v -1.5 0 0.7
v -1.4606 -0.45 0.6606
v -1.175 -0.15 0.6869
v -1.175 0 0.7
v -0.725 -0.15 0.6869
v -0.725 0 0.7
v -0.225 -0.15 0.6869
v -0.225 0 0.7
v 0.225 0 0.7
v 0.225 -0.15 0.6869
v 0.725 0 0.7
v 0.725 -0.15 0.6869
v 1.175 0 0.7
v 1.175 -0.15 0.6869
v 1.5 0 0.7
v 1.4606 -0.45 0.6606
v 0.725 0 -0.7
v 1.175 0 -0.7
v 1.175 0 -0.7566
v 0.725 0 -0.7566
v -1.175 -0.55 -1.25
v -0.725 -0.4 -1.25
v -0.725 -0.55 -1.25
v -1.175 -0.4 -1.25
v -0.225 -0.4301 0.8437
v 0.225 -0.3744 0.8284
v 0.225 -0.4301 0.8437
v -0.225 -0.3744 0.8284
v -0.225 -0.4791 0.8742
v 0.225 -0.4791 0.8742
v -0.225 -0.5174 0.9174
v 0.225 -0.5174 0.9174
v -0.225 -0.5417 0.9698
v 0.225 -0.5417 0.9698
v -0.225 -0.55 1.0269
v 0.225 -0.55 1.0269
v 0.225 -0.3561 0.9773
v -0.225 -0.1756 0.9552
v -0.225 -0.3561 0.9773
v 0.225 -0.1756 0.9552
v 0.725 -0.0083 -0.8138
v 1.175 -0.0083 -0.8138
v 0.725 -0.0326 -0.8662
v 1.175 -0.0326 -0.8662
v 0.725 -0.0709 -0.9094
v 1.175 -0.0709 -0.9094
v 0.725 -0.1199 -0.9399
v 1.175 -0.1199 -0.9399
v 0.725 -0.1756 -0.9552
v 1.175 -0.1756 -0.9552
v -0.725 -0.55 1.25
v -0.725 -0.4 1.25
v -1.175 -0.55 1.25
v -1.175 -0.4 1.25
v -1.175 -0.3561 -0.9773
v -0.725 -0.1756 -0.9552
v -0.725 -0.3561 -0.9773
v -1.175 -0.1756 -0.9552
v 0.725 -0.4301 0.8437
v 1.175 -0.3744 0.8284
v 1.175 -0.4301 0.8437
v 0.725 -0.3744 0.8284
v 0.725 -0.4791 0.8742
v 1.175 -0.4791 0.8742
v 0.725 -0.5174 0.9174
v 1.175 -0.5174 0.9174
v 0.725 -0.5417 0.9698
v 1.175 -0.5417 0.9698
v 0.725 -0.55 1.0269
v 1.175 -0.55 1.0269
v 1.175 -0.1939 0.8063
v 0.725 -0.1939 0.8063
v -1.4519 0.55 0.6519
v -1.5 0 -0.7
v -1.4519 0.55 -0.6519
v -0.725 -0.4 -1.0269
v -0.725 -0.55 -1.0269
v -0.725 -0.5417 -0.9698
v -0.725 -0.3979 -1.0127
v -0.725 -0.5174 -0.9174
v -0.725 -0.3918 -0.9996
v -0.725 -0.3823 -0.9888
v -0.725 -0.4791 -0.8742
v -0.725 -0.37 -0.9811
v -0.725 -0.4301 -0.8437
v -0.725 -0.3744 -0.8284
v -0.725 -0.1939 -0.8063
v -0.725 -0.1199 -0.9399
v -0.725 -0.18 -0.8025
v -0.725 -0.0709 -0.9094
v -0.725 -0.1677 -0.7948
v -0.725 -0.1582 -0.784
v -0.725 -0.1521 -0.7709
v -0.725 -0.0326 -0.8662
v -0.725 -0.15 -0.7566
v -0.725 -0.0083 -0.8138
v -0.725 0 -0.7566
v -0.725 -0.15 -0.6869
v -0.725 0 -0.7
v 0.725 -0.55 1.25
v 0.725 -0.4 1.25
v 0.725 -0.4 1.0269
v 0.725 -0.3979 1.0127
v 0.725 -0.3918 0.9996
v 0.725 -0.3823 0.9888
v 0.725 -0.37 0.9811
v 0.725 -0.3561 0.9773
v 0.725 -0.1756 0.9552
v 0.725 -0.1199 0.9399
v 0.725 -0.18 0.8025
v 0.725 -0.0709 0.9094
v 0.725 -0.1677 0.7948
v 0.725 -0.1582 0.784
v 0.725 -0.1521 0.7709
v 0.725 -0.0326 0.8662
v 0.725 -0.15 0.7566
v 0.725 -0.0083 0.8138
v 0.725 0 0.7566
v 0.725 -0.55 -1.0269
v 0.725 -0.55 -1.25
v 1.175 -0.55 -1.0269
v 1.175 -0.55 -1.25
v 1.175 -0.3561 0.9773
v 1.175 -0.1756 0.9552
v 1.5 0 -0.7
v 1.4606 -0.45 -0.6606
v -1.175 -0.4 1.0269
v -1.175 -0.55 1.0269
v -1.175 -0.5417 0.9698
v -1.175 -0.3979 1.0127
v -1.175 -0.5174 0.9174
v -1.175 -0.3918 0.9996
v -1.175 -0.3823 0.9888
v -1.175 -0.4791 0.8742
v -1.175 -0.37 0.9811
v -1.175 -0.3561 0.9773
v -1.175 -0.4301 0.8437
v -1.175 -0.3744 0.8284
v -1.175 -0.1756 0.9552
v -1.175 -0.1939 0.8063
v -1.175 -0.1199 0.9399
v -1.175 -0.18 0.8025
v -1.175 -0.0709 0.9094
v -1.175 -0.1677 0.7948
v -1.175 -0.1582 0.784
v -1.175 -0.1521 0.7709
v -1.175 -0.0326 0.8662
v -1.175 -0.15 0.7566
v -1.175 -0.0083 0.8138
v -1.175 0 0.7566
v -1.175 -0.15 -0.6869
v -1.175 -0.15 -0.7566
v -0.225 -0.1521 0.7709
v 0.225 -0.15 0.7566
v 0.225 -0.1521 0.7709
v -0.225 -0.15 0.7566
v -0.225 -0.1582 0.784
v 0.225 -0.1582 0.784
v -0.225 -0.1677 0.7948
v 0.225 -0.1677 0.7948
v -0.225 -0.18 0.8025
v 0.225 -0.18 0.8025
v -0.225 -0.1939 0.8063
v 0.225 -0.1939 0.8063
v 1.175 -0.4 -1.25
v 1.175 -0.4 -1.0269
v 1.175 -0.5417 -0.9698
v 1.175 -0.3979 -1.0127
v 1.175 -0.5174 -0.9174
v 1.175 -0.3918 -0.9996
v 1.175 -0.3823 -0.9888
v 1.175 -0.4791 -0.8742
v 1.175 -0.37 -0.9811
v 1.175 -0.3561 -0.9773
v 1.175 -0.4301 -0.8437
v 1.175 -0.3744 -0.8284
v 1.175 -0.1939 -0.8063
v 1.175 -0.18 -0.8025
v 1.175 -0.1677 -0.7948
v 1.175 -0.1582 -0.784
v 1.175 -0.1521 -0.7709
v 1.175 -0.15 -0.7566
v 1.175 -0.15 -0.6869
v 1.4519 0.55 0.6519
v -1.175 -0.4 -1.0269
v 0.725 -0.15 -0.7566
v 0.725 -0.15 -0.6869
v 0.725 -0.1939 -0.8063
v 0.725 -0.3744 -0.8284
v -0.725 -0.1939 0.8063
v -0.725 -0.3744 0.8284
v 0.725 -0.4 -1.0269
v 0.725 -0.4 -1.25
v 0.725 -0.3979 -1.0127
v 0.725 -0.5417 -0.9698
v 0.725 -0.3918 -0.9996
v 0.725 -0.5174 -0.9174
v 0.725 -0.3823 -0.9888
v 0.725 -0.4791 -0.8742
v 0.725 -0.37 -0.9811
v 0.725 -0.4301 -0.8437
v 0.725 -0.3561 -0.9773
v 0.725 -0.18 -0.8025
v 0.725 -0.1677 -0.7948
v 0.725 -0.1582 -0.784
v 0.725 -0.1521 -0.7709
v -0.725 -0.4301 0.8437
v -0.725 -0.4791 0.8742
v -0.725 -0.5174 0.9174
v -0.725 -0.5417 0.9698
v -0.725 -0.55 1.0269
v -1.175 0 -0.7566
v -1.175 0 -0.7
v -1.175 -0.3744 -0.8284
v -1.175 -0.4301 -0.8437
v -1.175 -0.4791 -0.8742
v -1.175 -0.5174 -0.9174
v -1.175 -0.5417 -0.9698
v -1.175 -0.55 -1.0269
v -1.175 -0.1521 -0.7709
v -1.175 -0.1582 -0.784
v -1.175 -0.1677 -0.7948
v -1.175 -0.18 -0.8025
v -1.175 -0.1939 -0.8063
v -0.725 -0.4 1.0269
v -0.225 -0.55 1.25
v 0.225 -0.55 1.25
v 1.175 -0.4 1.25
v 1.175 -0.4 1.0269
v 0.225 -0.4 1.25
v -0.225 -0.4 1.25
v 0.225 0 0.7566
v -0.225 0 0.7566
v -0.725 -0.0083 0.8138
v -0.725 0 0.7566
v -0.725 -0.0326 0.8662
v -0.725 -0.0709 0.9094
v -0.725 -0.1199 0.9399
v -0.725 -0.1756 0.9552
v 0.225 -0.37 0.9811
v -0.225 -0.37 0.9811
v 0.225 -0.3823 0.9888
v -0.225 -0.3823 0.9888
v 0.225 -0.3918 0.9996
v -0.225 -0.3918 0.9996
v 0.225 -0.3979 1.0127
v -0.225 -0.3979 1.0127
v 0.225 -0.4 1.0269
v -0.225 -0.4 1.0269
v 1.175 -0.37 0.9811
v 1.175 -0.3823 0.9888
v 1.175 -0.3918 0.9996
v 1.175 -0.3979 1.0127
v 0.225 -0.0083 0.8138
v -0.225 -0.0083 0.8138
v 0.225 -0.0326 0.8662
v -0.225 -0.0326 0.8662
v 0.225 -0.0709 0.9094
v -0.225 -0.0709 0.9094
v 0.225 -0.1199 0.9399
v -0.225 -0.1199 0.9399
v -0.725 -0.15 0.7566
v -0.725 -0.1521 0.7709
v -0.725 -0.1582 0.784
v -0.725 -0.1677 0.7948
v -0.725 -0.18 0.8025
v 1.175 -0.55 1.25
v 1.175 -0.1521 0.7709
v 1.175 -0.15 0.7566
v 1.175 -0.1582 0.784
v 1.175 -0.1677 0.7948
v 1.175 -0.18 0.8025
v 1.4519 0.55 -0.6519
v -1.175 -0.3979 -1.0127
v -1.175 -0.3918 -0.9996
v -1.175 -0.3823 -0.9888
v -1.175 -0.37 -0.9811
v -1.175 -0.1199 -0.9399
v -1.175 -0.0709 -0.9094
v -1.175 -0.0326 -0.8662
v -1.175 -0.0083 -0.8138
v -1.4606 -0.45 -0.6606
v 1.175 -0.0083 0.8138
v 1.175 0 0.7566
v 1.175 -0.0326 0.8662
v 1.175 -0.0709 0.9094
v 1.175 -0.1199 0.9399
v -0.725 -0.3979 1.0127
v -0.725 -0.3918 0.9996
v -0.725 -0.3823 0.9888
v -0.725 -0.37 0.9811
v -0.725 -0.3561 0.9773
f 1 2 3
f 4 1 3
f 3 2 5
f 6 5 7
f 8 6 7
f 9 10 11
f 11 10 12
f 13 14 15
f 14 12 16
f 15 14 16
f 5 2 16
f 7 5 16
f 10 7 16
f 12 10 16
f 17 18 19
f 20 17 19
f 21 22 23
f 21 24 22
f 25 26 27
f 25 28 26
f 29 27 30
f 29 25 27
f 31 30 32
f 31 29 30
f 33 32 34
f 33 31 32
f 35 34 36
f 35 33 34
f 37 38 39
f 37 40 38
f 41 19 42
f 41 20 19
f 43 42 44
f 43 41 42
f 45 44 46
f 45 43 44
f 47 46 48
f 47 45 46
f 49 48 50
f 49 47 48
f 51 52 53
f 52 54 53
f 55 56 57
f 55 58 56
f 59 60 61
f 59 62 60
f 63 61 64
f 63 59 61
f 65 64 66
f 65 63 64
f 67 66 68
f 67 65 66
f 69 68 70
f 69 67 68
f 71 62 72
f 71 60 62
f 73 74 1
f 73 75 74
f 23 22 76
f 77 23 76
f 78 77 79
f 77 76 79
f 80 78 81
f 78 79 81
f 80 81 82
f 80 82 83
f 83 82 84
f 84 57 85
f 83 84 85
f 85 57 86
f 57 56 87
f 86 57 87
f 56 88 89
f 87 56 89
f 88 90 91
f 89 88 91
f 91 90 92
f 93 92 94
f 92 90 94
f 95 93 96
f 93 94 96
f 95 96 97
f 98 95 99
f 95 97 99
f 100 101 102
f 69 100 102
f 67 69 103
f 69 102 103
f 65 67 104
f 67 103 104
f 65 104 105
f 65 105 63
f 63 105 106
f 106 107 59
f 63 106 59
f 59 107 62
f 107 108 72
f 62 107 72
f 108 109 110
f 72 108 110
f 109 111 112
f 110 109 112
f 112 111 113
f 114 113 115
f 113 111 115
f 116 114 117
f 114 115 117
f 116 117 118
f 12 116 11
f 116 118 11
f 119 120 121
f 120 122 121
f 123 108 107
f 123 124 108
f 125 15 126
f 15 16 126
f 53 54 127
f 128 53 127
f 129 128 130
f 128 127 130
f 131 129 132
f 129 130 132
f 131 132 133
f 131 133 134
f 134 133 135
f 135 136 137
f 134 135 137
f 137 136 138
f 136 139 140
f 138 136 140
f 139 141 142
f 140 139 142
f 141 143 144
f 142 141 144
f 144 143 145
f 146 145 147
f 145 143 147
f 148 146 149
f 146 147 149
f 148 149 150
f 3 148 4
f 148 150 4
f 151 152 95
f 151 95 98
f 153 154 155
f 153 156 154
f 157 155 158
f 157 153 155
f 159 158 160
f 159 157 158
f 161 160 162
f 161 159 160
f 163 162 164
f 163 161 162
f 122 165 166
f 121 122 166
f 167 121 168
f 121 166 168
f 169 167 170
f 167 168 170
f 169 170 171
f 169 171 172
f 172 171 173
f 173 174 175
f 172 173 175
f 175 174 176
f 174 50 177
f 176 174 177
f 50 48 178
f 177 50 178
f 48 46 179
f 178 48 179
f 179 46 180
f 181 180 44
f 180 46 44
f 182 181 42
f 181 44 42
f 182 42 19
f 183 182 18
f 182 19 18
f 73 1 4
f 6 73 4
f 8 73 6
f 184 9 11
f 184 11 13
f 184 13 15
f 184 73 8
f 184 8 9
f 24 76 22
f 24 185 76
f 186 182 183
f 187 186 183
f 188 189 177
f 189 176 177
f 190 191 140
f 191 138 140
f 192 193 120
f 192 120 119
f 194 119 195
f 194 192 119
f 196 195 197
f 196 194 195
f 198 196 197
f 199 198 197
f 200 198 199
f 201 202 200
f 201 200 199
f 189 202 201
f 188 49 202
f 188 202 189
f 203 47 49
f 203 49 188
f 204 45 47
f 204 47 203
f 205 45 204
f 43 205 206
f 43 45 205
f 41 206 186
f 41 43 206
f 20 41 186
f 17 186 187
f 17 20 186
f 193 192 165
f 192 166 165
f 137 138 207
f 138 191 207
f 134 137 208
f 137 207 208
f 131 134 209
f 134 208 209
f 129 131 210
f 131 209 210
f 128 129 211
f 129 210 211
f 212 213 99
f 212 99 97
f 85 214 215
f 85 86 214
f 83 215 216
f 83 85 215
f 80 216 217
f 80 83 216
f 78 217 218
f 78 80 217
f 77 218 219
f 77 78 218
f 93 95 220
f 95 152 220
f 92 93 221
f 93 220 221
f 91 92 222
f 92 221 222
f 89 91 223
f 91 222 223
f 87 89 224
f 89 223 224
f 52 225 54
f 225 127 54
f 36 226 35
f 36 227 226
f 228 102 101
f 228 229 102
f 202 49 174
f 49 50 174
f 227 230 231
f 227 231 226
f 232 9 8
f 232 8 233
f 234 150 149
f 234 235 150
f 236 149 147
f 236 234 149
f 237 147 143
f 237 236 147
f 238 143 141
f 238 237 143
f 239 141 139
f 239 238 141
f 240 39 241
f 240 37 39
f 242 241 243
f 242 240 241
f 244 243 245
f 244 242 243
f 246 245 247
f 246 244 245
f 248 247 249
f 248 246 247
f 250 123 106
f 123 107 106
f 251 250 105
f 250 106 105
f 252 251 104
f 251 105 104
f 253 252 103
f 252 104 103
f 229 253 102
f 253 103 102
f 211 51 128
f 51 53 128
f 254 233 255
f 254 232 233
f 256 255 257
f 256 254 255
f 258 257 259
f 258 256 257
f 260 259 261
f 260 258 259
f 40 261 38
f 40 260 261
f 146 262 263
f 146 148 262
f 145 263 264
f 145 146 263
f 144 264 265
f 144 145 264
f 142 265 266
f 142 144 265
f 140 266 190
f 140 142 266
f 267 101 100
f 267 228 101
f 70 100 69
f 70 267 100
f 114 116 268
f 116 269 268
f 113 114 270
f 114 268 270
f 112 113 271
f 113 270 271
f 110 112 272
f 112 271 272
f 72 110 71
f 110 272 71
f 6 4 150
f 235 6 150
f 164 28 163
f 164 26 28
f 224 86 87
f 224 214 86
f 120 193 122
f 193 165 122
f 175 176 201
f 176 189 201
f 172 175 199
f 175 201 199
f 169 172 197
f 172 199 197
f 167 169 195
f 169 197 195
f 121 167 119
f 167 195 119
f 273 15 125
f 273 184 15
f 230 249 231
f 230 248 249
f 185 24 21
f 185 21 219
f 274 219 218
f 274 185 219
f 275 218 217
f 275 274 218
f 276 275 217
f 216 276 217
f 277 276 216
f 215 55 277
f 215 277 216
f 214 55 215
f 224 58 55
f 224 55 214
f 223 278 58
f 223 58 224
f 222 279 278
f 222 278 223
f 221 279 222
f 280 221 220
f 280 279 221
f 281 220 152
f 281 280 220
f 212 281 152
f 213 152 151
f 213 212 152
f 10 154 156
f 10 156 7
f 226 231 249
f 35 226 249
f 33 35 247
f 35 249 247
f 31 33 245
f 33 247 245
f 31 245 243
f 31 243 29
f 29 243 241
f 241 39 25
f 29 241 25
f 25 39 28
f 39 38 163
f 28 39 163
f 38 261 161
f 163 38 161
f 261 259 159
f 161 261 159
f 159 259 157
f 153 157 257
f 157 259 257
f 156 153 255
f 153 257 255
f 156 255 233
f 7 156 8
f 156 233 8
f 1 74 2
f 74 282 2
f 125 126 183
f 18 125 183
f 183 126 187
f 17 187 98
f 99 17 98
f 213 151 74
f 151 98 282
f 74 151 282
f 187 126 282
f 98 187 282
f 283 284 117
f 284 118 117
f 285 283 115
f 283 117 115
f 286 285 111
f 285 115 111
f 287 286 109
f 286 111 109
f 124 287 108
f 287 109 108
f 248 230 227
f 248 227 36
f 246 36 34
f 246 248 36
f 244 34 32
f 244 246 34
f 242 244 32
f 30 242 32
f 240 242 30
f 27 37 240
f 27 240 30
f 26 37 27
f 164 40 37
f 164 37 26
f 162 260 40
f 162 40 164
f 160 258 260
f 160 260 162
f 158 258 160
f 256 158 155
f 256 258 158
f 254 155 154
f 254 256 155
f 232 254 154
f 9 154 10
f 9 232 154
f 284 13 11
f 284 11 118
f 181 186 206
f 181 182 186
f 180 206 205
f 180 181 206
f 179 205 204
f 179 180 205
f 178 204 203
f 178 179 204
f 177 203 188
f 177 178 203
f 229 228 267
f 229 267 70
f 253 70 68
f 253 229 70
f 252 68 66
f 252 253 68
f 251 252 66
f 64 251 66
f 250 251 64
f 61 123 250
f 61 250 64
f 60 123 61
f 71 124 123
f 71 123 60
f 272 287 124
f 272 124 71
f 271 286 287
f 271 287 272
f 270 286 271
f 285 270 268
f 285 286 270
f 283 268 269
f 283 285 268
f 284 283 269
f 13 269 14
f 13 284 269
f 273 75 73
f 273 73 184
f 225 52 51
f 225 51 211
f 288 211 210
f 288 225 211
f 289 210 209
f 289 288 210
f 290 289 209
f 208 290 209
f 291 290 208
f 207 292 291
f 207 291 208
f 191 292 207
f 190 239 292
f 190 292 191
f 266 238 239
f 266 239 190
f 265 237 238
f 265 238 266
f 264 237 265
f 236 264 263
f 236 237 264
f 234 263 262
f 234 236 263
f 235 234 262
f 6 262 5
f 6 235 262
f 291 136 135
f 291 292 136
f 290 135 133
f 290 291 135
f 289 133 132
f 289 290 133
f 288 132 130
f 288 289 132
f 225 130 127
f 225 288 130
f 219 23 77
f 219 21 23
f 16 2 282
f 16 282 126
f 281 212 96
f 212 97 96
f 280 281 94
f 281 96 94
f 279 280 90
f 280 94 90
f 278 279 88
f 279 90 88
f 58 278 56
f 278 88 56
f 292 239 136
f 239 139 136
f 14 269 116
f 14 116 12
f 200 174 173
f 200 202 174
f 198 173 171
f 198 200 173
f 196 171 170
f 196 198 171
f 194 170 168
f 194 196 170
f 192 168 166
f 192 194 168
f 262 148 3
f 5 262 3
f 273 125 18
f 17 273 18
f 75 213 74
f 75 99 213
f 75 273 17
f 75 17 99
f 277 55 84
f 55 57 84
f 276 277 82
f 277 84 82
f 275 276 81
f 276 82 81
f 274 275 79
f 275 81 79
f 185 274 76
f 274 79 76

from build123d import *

# Parameters (mm, degrees)
SKETCH1_W                = 3
SKETCH1_H                = 1.4
EXTRUDE1_DEPTH           = 0.55
EXTRUDE1_TAPER           = 5
EXTRUDE1_OTHER_WAY_DEPTH = 0.45
EXTRUDE1_OTHER_WAY_TAPER = 5
EXTRUDE2_DEPTH           = 0.225
EXTRUDE2_DEPTH_BACK      = 0.225
EXTRUDE3_START           = 0.95
EXTRUDE3_DEPTH           = 0.225
MIRROR_START             = 0.95
MIRROR_1_COPY_1_DEPTH    = 0.225
FILLET1_R                = 0.05
FILLET2_R                = 0.2


with BuildPart() as part:
    # Sketch1 → Extrude1 (new body)
    with BuildSketch(Plane(origin=(0, 0, 0), x_dir=(1, 0, 0), z_dir=(0, 1, 0))):
        Rectangle(SKETCH1_W, SKETCH1_H)
    extrude(amount=EXTRUDE1_DEPTH, taper=EXTRUDE1_TAPER)

    # Sketch1 → Extrude1 other way (add)
    with BuildSketch(Plane(origin=(0, 0, 0), x_dir=(1, 0, 0), z_dir=(0, 1, 0))):
        Rectangle(SKETCH1_W, SKETCH1_H)
    extrude(amount=-EXTRUDE1_OTHER_WAY_DEPTH, taper=EXTRUDE1_OTHER_WAY_TAPER)

    # Sketch2 → Extrude2 (add, two sides)
    with BuildSketch(Plane(origin=(0, 0, 0), x_dir=(0, 0, -1), z_dir=(1, 0, 0))) as extrude2_sk:
        Polygon((-0.585273808, 0), (-0.933594965, 0), (-0.98270879, -0.4), (-1.25, -0.4), (-1.25, -0.55), (-0.85, -0.55), (-0.800886176, -0.15), (-0.585273808, -0.15), align=None)
    extrude(amount=EXTRUDE2_DEPTH)
    extrude(extrude2_sk.sketch, amount=-EXTRUDE2_DEPTH_BACK)

    # Sketch2_3 → Extrude3 (add, symmetric)
    with BuildSketch(Plane(origin=(0, 0, 0), x_dir=(0, 0, -1), z_dir=(1, 0, 0)).offset(EXTRUDE3_START)):
        Polygon((0.585273808, 0), (0.933594965, 0), (0.98270879, -0.4), (1.25, -0.4), (1.25, -0.55), (0.85, -0.55), (0.800886176, -0.15), (0.585273808, -0.15), align=None)
    extrude3 = extrude(amount=EXTRUDE3_DEPTH, both=True)

    # Mirror1: Extrude3 across plane
    add(extrude3.mirror(Plane(origin=(0, 0, 0), x_dir=(0, 0, 1), z_dir=(1, 0, 0))))

    # Mirror 1: Extrude3 across plane
    add(extrude3.mirror(Plane.XY))

    # Mirror 1 copy 1 sketch → Mirror 1 copy 1 (add, symmetric)
    with BuildSketch(Plane.ZY.offset(MIRROR_START)):
        Polygon((0.585273808, 0), (0.933594965, 0), (0.98270879, -0.4), (1.25, -0.4), (1.25, -0.55), (0.85, -0.55), (0.800886176, -0.15), (0.585273808, -0.15), align=None)
    extrude(amount=MIRROR_1_COPY_1_DEPTH, both=True)

    # Fillet1
    fillet1_edges = [part.edges().sort_by_distance(p)[0] for p in [
        (0.95, -0.4, 0.98270879),
        (0.95, -0.15, 0.800886176),
        (-0.95, -0.15, 0.800886176),
        (-0.95, -0.4, 0.98270879),
        (0, -0.4, 0.98270879),
        (0, -0.15, 0.800886176),
        (0.95, -0.15, -0.800886176),
        (0.95, -0.4, -0.98270879),
        (-0.95, -0.4, -0.98270879),
        (-0.95, -0.15, -0.800886176),
    ]]
    fillet(fillet1_edges, radius=FILLET1_R)

    # Fillet2
    fillet2_edges = [part.edges().sort_by_distance(p)[0] for p in [
        (0.95, 0, 0.933594965),
        (0.95, -0.55, 0.85),
        (-0.95, 0, 0.933594965),
        (-0.95, -0.55, 0.85),
        (0, 0, 0.933594965),
        (0, -0.55, 0.85),
        (0.95, 0, -0.933594965),
        (0.95, -0.55, -0.85),
        (-0.95, 0, -0.933594965),
        (-0.95, -0.55, -0.85),
    ]]
    fillet(fillet2_edges, radius=FILLET2_R)


solid = part.part
